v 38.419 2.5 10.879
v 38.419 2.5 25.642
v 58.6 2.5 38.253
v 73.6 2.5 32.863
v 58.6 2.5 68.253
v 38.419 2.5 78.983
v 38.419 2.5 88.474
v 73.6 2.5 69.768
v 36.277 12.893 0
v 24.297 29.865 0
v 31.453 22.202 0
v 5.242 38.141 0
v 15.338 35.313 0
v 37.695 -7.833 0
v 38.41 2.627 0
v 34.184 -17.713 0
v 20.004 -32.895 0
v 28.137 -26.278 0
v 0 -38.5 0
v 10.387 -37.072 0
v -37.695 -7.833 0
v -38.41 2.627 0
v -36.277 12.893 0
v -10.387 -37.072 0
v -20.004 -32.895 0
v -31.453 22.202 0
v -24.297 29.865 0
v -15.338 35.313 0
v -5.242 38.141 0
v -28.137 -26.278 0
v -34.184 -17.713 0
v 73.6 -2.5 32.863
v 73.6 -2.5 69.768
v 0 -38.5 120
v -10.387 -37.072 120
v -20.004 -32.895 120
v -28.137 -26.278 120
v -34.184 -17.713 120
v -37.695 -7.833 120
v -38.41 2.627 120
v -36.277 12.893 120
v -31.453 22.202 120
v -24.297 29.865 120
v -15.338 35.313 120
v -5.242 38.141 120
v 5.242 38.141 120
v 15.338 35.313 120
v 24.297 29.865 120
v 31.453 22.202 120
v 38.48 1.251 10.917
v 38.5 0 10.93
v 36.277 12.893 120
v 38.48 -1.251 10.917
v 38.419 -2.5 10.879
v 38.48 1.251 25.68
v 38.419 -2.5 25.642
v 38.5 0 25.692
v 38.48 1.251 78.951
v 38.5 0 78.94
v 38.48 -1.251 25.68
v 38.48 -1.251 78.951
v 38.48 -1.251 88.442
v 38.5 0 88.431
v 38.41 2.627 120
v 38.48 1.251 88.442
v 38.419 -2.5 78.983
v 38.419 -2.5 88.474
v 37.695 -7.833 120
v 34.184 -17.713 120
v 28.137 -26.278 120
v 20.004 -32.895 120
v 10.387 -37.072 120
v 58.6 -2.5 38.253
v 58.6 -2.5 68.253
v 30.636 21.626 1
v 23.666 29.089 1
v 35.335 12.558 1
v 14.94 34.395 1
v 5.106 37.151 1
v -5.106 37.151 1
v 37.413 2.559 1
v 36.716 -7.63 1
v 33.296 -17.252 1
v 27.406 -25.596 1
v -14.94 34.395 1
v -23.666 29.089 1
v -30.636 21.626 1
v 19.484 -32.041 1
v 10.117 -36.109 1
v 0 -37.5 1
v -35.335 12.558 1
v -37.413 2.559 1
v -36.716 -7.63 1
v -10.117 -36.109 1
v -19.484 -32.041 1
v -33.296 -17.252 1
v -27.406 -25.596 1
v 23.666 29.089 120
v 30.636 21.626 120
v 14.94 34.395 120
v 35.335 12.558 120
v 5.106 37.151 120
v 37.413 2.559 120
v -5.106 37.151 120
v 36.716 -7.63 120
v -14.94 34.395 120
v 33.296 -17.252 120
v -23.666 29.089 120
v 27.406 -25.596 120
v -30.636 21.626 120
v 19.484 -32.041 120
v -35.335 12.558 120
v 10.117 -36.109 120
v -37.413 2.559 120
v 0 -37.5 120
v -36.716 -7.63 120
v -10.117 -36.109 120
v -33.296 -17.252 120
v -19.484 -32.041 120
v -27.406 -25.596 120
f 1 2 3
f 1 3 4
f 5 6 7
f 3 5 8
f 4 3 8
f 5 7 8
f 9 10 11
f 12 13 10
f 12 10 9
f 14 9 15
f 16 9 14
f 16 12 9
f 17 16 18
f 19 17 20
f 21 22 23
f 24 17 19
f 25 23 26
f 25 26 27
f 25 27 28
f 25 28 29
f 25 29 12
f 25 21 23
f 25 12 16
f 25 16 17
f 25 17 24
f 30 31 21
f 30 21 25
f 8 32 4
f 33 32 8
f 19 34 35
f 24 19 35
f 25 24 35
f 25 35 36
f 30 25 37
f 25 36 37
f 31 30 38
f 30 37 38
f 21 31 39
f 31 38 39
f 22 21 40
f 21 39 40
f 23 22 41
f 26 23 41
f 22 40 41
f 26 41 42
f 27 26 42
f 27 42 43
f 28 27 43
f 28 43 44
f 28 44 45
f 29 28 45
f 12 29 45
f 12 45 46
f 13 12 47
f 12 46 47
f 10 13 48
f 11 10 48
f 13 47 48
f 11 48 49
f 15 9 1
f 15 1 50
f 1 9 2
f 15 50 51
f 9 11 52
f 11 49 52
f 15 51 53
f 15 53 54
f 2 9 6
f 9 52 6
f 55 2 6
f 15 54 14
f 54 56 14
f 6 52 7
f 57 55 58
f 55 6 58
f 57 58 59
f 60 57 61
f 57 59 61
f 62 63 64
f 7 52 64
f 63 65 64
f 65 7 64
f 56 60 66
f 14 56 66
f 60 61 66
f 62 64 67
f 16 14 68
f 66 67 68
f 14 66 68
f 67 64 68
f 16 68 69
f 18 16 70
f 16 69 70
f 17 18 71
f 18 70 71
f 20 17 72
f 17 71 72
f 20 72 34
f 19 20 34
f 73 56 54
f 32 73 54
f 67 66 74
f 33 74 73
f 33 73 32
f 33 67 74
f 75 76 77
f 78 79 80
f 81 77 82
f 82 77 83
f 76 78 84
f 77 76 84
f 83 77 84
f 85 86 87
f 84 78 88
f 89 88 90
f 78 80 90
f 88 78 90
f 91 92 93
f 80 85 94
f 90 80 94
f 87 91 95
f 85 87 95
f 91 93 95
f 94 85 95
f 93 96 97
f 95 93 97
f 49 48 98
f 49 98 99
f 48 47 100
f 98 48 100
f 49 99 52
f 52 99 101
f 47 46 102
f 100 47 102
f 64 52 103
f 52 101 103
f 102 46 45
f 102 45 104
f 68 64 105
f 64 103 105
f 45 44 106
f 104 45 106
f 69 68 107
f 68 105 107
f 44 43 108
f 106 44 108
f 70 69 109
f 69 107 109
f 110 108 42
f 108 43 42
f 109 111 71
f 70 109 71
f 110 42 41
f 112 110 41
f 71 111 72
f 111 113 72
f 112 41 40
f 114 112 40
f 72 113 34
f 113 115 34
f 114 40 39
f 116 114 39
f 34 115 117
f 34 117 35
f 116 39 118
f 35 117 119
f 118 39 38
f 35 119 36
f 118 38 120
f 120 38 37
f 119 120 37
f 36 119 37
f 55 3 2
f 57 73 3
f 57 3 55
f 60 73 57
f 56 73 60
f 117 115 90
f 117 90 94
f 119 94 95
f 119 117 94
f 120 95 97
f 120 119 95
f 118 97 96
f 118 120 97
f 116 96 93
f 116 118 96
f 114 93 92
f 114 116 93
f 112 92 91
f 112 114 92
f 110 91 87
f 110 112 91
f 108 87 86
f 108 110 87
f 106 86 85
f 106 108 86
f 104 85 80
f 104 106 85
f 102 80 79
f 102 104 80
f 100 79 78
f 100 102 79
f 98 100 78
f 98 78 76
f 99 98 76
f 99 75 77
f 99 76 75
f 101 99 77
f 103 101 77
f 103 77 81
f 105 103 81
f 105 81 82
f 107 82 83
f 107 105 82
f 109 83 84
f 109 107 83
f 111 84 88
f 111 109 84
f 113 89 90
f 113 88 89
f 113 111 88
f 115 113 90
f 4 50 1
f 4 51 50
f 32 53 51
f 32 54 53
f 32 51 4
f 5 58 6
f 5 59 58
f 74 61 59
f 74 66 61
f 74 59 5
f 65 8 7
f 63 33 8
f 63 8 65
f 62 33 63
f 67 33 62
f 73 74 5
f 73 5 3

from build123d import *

# Parameters (mm, degrees)
F0_W     = 38.5
F0_H     = 120
F2_T     = -1
F4_DEPTH = 2.5


with BuildPart() as f1:
    # F0 (on Right) → F1 (revolve)
    with BuildSketch(Plane.YZ):
        with Locations((-19.25, 60)):
            Rectangle(F0_W, F0_H)
    revolve(axis=Axis((0, 0, 60), (0, 0, -1)))

    # F2
    f2_openings = [f1.faces().sort_by_distance(p)[0] for p in [
        (0, 0, 120),
    ]]
    offset(amount=F2_T, openings=f2_openings)

    # F3 (on Front) → F4 (join, symmetric)
    with BuildSketch(Plane.XZ):
        Polygon((73.600475, 69.767932), (38.349035, 88.511455), (38.184893, 79.107806), (58.600475, 68.252649), (58.600475, 38.252649), (37.887409, 25.309689), (37.887409, 10.546948), (73.600475, 32.862948), align=None)
    extrude(amount=F4_DEPTH, both=True)


solid = f1.part
